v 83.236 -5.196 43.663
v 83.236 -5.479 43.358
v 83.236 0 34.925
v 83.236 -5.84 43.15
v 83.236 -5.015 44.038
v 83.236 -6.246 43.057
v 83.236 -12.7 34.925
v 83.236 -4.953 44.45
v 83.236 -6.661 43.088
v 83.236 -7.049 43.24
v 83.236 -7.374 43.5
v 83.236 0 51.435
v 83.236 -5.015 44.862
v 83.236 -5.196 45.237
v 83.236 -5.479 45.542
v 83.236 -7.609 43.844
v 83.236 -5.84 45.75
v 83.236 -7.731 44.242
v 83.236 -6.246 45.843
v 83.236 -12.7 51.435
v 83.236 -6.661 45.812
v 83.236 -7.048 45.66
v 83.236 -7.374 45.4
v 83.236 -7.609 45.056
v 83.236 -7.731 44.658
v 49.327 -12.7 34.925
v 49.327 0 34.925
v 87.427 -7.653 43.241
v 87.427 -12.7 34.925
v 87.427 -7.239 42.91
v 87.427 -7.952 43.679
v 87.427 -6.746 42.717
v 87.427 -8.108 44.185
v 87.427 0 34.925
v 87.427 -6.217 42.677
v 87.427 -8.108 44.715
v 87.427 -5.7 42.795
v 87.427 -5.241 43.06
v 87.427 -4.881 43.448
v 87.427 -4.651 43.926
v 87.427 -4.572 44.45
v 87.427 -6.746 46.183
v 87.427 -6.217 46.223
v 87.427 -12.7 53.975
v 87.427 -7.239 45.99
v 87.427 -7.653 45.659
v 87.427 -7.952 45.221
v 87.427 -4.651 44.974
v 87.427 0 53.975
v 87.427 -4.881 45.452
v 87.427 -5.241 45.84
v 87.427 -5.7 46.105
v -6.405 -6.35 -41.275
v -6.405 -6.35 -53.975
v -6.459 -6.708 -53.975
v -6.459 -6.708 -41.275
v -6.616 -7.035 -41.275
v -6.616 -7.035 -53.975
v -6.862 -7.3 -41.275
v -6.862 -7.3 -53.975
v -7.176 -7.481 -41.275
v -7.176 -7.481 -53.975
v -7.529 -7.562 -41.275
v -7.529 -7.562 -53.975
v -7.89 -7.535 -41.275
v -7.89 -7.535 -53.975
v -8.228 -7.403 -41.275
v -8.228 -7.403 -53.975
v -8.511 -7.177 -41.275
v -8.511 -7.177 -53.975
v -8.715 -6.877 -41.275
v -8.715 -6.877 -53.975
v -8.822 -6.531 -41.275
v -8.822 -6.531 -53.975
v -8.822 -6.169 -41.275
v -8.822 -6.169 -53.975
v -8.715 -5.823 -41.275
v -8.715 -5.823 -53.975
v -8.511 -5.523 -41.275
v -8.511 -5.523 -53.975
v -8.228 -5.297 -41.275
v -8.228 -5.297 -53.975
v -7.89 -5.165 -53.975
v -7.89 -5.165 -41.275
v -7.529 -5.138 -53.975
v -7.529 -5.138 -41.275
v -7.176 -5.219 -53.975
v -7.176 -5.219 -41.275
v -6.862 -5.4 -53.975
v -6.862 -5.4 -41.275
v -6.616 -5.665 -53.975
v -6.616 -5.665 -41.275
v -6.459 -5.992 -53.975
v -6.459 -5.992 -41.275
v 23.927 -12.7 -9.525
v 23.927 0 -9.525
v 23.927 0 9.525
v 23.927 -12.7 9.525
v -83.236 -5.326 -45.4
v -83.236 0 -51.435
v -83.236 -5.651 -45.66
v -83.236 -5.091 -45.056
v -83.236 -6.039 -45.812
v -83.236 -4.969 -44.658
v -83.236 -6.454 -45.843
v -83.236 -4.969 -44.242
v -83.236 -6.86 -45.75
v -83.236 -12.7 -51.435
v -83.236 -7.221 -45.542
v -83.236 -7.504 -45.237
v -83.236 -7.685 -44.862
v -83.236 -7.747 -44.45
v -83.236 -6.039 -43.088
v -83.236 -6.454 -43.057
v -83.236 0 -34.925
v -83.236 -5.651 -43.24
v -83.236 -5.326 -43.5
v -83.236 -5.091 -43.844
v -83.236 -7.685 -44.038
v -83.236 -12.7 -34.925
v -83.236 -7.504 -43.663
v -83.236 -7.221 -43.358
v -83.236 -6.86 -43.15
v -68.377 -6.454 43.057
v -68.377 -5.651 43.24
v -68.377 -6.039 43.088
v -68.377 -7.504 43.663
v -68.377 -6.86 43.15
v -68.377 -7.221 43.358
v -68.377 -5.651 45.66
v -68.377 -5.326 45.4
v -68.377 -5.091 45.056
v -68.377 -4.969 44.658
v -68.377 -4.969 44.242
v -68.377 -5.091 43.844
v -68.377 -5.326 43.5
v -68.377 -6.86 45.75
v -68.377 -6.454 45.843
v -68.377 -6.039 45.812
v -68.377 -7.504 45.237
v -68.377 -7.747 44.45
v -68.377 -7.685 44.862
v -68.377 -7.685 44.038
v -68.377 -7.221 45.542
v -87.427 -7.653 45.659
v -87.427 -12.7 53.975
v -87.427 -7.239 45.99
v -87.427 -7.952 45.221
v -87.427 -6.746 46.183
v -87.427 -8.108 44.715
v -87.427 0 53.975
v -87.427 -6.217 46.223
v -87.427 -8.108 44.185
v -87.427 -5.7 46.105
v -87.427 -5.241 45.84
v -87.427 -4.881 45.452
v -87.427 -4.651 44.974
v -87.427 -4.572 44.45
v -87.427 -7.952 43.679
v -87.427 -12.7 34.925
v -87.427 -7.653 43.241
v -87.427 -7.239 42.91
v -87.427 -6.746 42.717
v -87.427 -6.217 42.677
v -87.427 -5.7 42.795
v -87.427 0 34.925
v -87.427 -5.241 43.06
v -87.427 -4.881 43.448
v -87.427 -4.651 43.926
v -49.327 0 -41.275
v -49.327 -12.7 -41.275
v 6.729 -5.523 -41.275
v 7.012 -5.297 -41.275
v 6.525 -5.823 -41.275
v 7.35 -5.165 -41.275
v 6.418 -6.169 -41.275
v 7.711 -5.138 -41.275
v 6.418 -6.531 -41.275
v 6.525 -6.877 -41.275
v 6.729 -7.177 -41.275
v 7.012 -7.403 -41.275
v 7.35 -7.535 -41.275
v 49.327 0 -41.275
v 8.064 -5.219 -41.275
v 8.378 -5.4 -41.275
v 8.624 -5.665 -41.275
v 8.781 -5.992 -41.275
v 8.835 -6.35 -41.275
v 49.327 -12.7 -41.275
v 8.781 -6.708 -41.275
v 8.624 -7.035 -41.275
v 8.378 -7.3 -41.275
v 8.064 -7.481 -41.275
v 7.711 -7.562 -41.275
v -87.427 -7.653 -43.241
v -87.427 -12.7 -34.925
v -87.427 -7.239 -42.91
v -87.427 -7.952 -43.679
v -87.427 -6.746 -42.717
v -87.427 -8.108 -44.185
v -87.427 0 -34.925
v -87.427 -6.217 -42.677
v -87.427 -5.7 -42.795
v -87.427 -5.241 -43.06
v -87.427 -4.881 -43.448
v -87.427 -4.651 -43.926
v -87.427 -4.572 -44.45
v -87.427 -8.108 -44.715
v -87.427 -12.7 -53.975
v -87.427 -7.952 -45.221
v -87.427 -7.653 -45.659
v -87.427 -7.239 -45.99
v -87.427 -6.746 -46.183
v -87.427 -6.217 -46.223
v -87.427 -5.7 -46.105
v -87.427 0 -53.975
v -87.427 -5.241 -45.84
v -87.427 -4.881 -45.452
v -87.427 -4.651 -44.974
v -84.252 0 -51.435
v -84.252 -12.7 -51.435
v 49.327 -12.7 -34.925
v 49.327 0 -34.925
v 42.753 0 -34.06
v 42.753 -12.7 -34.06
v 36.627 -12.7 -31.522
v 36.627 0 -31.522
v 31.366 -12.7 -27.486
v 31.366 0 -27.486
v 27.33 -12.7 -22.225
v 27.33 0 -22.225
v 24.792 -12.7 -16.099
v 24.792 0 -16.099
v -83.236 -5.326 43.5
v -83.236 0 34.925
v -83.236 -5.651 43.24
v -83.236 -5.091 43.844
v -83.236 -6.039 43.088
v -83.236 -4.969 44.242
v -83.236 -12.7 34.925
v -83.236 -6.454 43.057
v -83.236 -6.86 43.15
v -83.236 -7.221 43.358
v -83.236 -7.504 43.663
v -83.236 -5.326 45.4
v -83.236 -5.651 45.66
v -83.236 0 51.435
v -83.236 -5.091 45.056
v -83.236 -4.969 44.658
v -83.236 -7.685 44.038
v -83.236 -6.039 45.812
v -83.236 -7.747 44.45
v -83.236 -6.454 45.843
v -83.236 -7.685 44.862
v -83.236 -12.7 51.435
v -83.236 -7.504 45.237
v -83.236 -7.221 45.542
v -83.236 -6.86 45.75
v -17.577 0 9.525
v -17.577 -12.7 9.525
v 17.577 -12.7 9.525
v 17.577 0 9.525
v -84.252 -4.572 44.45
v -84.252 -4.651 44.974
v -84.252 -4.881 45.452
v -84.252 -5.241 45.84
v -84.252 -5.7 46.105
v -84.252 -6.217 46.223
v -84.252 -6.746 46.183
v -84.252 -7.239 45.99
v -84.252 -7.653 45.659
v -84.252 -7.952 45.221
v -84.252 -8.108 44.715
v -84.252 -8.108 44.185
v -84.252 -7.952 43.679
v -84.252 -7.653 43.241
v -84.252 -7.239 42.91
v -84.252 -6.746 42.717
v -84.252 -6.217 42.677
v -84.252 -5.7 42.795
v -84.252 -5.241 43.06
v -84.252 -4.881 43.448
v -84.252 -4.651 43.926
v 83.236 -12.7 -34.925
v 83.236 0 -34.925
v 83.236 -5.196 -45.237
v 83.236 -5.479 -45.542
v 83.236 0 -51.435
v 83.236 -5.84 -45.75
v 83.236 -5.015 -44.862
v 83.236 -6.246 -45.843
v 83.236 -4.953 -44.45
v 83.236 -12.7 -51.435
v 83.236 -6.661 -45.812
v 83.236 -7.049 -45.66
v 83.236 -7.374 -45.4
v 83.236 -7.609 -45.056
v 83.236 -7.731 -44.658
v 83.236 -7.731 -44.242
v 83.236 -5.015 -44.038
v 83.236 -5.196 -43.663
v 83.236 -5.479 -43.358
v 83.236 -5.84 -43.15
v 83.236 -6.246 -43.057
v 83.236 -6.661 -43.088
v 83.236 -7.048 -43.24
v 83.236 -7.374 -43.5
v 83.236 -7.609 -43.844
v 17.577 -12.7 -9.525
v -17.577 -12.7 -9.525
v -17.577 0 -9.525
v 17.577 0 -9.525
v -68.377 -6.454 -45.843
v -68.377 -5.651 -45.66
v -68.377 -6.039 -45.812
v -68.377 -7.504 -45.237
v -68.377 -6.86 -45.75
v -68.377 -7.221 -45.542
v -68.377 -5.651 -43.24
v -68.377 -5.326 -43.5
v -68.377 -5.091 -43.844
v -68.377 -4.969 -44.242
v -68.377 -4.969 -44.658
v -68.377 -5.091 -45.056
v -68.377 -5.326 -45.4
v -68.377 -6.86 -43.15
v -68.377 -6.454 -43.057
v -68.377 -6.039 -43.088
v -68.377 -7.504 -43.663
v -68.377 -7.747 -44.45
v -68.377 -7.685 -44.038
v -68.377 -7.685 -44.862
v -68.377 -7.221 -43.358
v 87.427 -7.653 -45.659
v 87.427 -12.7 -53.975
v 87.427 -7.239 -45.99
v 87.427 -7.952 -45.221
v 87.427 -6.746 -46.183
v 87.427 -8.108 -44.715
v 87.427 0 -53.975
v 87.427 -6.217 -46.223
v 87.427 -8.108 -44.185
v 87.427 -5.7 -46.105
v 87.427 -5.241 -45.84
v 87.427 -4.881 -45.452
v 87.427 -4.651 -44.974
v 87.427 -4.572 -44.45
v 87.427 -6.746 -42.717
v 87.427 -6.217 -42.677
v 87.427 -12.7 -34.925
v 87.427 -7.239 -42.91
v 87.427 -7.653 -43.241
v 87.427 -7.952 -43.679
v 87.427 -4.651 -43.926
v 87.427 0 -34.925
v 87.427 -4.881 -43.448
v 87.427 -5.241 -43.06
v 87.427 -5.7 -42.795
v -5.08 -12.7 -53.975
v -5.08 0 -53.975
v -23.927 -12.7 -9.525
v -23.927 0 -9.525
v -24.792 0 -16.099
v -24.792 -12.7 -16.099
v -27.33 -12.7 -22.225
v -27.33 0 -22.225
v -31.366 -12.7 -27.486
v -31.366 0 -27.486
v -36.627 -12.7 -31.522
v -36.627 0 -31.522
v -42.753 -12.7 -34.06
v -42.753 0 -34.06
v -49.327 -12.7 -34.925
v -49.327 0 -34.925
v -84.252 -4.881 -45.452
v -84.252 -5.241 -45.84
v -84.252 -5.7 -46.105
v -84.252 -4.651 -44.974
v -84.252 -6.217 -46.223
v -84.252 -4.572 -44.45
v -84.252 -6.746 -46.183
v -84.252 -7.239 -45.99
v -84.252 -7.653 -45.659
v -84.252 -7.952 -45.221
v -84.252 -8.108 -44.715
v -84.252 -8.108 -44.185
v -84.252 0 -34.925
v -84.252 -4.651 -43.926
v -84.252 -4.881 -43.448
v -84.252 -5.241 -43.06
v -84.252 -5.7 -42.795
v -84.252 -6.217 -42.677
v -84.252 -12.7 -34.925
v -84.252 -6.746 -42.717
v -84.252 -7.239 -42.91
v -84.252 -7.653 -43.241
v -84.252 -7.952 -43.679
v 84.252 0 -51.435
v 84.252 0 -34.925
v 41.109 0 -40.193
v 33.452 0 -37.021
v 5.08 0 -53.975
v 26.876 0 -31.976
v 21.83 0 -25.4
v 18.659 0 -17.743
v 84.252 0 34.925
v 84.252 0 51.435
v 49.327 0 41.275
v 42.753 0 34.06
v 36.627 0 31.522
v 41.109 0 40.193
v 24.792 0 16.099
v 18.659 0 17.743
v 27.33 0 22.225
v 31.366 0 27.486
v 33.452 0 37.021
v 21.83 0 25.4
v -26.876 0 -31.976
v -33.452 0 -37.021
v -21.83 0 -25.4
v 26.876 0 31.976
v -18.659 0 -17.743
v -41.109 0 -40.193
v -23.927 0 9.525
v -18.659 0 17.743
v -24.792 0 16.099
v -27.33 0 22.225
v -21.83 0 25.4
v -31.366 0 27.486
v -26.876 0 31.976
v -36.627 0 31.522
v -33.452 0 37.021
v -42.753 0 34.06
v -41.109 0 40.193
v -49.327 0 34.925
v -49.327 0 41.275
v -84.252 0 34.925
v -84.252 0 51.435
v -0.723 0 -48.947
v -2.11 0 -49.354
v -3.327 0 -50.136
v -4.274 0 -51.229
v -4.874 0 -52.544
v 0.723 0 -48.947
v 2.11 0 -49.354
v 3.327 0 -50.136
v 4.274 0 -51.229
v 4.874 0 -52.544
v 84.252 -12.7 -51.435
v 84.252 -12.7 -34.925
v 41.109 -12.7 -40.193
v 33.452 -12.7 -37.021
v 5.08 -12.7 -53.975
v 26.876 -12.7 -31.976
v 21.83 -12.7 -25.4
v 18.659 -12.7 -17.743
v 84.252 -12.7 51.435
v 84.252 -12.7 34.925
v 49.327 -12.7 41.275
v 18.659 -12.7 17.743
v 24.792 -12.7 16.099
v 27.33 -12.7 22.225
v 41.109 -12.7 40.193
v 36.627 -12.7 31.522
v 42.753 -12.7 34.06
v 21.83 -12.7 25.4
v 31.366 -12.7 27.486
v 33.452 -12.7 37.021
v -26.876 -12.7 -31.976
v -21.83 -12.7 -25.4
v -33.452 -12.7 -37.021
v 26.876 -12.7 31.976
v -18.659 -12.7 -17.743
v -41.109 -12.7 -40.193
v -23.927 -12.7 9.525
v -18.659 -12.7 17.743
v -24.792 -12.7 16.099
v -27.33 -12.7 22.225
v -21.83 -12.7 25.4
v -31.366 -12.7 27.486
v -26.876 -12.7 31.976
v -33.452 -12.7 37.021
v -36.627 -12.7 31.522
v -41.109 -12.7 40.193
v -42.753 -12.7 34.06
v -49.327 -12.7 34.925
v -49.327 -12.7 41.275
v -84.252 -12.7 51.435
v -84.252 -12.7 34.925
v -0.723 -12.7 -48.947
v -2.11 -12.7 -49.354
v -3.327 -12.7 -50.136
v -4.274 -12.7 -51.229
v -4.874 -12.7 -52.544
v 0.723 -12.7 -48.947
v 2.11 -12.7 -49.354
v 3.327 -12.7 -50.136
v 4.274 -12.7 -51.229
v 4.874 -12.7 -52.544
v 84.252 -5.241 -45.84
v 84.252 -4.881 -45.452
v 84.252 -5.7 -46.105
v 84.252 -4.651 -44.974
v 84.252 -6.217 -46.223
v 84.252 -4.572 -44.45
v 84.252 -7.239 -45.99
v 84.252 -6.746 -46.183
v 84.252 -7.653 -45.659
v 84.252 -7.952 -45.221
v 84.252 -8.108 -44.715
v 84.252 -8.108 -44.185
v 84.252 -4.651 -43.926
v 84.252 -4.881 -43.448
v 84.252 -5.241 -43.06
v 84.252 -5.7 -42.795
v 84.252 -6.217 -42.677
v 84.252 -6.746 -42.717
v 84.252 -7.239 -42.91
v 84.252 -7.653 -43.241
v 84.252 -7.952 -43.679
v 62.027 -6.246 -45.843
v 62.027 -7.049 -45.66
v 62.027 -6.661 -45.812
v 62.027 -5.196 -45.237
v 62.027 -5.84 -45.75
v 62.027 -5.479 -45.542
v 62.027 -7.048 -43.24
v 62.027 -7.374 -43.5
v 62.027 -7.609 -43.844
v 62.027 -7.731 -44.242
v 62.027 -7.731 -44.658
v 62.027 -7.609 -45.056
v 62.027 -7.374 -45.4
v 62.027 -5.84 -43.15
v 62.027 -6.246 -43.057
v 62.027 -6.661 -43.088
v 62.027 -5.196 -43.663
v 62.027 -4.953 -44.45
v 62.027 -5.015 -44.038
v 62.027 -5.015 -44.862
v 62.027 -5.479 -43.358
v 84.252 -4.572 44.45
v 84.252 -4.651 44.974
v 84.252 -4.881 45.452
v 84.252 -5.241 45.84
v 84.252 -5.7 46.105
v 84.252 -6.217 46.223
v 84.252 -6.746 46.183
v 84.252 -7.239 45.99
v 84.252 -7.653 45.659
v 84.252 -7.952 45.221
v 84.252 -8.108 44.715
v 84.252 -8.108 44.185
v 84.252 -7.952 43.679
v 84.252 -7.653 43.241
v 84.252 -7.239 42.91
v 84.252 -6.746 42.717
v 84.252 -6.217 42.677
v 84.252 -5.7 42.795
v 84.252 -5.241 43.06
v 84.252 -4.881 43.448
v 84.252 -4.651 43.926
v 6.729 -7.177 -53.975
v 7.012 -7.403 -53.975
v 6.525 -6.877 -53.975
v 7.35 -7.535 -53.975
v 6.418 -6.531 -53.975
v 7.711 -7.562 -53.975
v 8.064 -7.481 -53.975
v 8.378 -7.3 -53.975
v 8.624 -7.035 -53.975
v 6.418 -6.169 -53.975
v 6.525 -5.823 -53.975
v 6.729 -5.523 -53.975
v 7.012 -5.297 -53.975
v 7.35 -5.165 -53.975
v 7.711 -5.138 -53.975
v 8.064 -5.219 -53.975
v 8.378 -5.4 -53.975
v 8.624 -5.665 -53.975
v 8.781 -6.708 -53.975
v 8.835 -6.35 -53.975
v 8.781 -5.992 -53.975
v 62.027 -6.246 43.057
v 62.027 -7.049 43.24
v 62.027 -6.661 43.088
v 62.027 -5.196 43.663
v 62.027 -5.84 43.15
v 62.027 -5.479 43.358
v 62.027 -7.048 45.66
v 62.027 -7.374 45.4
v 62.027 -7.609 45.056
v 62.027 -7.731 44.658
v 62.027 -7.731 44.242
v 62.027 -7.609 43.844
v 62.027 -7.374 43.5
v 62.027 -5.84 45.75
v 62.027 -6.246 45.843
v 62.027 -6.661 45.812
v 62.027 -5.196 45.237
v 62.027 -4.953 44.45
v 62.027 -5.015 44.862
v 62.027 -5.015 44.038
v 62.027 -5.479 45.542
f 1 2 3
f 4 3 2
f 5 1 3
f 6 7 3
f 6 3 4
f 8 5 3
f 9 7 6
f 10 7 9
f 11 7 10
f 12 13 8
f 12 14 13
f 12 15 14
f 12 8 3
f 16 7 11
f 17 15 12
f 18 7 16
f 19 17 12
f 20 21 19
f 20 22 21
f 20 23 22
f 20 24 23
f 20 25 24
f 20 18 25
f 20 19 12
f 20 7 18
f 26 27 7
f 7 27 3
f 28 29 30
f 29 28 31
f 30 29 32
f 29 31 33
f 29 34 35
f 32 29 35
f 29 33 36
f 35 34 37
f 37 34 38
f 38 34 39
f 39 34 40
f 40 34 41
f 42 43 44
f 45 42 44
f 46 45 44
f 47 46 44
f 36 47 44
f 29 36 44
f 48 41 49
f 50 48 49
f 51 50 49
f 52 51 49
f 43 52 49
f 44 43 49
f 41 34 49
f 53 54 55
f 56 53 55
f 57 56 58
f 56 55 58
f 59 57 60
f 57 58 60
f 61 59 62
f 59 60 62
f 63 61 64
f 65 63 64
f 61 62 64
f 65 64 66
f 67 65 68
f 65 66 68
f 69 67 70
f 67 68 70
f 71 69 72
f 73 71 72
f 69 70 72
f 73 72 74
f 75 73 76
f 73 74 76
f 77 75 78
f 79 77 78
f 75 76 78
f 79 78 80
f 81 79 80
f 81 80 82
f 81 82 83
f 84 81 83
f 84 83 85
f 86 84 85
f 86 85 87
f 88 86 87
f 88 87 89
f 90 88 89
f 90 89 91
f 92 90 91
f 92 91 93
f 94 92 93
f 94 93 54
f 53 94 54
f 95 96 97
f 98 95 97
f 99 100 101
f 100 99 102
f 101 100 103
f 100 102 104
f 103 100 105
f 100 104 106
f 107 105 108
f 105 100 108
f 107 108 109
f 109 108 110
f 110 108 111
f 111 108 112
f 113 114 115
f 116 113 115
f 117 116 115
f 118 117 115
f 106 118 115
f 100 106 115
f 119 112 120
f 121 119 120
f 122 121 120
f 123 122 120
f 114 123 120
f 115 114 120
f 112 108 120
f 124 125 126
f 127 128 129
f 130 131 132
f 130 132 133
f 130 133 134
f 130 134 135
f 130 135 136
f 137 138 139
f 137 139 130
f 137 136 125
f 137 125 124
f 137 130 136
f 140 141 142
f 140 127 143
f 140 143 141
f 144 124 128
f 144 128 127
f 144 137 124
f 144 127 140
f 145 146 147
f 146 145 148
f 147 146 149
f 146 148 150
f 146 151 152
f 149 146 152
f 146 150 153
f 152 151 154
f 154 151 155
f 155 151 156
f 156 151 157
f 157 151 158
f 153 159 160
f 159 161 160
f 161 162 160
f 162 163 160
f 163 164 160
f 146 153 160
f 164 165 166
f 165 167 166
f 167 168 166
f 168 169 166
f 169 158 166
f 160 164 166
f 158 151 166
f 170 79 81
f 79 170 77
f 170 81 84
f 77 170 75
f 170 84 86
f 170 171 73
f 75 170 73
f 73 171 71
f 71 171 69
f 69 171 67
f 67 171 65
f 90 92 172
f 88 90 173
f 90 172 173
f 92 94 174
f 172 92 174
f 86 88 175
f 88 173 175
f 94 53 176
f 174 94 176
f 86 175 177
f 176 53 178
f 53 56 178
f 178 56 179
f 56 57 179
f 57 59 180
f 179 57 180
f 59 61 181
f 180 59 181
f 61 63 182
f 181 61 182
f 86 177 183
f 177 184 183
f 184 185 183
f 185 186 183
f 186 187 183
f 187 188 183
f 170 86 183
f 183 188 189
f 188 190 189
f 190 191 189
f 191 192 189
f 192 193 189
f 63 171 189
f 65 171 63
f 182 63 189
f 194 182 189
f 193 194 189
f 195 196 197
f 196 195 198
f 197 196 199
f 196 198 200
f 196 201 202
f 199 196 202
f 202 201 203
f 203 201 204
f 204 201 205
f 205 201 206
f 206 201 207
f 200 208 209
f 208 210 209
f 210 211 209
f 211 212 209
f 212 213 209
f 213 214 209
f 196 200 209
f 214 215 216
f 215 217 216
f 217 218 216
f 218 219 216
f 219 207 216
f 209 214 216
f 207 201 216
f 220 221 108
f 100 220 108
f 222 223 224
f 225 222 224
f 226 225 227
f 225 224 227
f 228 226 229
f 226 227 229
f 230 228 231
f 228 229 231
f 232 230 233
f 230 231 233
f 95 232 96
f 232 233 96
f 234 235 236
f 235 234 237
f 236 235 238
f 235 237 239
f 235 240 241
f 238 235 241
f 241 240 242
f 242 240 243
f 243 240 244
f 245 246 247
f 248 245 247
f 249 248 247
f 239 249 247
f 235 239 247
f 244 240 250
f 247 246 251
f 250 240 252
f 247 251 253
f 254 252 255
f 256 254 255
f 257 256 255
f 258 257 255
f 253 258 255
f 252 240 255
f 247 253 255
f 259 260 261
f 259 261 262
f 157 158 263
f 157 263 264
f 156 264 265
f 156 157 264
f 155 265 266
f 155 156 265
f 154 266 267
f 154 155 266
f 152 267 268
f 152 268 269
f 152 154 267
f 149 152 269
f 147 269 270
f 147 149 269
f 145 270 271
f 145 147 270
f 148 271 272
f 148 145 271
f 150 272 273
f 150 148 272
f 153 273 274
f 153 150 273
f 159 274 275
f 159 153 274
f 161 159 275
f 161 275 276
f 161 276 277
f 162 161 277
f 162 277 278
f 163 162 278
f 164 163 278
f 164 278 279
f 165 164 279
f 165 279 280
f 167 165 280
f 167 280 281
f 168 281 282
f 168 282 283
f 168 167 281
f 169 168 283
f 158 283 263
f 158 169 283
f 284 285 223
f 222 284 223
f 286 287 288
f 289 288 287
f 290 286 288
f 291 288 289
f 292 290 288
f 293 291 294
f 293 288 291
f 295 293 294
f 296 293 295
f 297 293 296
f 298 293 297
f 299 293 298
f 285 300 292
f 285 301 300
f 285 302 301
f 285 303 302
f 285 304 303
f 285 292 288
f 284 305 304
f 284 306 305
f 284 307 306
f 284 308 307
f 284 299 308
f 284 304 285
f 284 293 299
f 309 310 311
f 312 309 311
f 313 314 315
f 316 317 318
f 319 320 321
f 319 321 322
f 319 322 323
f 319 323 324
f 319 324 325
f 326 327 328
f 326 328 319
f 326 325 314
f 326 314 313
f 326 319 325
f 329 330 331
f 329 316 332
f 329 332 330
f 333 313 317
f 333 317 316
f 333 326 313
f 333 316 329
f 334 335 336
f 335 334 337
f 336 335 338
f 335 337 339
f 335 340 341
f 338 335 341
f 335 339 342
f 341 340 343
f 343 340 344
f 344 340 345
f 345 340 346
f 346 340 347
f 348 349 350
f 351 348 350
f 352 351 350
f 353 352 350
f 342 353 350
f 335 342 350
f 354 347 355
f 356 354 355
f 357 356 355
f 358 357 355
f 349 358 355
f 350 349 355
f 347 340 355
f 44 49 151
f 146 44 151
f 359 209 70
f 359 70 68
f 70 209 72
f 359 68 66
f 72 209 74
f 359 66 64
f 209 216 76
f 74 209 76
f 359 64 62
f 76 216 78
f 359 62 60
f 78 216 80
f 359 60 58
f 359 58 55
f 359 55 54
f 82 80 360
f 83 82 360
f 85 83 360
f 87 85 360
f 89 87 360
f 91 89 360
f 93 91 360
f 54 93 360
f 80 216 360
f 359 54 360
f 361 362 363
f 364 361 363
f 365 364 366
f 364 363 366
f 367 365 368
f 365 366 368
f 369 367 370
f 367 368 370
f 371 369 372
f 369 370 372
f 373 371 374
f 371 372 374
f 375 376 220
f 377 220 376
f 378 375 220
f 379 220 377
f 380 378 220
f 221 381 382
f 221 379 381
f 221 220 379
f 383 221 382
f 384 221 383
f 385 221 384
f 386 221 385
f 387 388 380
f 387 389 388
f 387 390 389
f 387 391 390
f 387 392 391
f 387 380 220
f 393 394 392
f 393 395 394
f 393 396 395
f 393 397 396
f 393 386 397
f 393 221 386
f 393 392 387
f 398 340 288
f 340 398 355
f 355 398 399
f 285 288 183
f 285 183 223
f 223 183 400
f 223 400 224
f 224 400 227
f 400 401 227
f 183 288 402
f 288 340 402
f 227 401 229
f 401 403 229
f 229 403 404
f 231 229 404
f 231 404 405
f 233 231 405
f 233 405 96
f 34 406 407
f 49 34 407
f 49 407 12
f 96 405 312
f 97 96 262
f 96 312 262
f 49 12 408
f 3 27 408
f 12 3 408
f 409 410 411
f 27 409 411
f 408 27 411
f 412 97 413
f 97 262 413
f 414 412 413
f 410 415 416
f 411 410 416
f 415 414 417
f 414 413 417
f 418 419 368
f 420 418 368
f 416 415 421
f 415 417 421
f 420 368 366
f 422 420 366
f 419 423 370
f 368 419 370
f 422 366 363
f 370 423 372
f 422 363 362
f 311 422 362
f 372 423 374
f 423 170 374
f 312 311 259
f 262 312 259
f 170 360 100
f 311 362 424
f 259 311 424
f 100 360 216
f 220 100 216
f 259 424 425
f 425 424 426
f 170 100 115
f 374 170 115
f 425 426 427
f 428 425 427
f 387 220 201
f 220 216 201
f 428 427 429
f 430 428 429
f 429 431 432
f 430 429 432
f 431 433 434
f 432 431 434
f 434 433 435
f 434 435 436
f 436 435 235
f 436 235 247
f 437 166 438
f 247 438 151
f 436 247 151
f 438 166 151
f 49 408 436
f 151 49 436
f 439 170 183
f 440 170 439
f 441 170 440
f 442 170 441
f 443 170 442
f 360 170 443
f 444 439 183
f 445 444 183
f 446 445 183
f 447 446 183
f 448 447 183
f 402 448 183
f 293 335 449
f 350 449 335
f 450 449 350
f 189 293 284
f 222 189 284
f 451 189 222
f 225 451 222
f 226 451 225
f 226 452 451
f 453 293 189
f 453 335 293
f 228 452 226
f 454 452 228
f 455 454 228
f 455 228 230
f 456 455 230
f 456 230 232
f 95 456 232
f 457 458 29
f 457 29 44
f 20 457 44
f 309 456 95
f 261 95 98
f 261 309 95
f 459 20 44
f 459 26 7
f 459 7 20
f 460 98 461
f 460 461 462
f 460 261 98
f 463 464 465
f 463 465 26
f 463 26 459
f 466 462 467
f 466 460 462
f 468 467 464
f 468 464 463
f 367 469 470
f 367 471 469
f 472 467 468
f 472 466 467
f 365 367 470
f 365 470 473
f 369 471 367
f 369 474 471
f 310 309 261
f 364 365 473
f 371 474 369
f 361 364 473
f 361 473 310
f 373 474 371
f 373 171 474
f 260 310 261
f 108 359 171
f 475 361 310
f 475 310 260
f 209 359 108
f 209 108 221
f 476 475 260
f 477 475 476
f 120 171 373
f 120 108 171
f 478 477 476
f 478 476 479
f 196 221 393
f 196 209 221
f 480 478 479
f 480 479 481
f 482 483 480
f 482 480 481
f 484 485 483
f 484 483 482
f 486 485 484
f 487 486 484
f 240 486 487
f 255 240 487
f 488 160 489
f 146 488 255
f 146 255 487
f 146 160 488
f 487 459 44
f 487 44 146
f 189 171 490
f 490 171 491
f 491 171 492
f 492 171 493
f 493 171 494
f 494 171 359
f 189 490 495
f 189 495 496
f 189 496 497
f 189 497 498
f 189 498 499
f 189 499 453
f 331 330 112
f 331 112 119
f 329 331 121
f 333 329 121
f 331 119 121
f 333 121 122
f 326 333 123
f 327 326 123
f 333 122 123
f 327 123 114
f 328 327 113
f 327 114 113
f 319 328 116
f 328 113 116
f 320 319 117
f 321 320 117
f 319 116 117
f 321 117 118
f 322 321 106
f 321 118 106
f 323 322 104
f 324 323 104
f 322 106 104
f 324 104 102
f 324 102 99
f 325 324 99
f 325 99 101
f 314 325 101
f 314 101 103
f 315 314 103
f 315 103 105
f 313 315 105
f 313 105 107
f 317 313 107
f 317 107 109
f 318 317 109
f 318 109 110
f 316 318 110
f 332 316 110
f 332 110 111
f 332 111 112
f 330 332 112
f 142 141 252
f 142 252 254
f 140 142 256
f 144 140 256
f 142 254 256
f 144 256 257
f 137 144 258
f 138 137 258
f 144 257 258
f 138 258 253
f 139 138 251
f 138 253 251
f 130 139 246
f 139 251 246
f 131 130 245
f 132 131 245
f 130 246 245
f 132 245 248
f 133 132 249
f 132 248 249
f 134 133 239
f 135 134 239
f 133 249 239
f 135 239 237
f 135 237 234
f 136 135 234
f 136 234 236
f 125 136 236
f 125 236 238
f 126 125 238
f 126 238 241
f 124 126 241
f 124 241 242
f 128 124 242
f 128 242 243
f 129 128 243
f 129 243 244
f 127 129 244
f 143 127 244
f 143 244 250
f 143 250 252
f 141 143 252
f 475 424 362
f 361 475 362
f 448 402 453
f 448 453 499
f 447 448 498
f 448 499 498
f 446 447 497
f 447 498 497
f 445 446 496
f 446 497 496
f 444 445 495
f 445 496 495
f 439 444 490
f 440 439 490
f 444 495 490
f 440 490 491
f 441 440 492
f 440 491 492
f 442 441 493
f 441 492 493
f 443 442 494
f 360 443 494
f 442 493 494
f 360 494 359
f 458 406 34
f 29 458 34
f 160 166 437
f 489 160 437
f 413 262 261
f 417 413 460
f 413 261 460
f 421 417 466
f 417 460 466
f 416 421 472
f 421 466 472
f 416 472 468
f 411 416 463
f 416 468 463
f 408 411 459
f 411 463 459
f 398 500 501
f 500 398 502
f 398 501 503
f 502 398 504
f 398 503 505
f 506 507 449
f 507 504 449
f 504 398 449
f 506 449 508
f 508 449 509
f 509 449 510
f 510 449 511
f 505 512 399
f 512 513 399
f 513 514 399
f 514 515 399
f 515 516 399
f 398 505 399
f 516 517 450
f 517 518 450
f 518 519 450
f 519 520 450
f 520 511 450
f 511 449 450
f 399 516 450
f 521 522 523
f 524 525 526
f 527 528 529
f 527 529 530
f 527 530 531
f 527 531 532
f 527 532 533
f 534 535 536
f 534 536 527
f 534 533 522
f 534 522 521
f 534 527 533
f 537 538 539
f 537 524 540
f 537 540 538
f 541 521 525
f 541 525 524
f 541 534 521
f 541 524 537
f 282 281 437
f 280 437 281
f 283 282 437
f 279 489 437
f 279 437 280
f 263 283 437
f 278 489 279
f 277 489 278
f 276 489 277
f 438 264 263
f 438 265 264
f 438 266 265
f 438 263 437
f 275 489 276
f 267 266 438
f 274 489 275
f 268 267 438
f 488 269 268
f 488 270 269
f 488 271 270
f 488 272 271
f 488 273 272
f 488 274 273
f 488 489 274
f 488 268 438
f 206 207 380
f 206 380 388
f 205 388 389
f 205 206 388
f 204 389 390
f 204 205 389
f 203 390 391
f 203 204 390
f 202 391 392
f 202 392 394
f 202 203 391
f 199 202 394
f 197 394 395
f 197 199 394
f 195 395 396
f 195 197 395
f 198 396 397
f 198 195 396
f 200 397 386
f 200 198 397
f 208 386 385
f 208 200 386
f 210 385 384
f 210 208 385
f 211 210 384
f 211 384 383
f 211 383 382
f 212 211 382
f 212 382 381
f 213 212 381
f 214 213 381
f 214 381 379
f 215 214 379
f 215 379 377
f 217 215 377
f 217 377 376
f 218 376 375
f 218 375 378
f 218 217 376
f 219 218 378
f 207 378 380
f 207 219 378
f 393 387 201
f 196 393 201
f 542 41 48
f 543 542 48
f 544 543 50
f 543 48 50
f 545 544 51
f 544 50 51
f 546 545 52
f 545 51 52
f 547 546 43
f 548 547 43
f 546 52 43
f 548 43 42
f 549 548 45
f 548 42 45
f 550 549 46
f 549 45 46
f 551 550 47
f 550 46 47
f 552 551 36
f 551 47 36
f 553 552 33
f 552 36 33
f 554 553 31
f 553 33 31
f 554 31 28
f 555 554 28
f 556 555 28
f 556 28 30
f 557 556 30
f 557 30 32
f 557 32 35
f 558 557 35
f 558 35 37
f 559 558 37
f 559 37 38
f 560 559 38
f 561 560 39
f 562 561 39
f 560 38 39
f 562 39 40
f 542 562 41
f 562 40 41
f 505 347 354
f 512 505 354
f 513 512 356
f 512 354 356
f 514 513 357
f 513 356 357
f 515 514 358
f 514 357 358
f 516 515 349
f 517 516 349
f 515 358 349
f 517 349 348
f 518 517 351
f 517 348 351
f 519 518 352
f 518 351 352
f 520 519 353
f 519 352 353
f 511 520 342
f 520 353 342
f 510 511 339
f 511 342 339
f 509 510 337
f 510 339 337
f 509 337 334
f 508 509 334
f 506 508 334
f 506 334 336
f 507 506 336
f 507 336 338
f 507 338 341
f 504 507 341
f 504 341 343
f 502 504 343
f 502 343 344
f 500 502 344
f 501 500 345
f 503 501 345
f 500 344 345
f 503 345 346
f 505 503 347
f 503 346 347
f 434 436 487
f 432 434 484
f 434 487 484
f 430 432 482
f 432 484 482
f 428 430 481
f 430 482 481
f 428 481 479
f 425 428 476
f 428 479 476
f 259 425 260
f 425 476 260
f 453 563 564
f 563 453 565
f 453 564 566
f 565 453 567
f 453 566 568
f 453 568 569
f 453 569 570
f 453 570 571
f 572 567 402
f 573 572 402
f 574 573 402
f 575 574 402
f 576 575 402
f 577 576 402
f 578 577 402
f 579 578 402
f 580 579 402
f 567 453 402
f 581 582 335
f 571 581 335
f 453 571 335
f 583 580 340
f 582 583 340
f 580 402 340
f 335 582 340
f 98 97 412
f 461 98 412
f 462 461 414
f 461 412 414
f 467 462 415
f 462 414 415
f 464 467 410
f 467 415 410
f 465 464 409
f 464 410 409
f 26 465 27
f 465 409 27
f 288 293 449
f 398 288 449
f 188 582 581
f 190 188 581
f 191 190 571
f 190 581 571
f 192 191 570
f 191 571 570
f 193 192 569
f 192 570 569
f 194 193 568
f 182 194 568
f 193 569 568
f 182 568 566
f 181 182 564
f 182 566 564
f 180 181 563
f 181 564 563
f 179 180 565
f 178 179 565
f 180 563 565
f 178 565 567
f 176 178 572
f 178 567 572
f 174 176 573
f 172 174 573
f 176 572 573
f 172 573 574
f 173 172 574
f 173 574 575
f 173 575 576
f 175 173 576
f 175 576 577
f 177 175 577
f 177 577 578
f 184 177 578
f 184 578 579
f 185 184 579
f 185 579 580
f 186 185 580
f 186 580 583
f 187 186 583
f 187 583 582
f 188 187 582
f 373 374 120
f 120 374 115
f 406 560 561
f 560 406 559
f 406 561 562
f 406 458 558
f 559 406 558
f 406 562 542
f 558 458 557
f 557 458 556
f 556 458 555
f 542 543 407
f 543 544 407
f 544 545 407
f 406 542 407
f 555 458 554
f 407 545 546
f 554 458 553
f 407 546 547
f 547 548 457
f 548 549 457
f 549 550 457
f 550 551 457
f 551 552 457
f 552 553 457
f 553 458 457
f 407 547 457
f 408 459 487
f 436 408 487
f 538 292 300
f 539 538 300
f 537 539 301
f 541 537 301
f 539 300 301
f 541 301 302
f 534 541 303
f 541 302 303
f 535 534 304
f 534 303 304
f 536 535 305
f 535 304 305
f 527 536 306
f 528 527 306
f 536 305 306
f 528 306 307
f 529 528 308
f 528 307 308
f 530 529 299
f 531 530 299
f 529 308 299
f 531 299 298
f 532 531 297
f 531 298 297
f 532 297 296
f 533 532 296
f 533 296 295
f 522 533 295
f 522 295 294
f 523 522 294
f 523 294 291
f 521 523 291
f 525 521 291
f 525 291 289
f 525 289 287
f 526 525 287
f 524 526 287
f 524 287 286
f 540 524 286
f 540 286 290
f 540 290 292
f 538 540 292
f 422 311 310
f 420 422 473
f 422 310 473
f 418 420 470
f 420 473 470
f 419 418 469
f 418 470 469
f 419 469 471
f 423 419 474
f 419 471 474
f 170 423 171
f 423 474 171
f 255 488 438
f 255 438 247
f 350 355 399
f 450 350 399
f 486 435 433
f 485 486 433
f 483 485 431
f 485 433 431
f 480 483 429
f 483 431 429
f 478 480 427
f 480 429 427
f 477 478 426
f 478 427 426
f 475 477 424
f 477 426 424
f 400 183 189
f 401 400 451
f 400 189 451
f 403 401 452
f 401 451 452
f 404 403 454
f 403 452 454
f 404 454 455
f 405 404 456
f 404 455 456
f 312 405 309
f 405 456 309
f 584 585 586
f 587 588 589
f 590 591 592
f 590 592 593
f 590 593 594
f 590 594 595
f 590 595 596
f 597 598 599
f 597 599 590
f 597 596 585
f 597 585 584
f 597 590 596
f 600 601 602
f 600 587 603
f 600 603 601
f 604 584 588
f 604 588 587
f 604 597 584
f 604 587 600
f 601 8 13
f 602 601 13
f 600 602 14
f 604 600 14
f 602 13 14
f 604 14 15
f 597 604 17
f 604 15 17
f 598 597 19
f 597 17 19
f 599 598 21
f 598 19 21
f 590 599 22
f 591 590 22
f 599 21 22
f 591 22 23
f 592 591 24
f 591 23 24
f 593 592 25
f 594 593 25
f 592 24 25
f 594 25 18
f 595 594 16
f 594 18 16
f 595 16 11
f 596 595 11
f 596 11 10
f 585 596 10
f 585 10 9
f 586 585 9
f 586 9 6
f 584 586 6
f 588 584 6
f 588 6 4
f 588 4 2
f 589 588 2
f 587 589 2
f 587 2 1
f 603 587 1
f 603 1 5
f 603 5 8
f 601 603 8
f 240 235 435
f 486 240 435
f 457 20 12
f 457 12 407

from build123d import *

# Parameters (mm, degrees)
F1_DEPTH  = 12.7
F2_W      = 1.016
F2_H      = 102.87
F3_DEPTH  = 25.4
F4_R      = 5.08
F5_DEPTH  = 25.4
F6_R      = 1.21539
F7_DEPTH  = 25.4
F8_R      = 1.397
F9_DEPTH  = 25.4
F10_R     = 1.397
F11_DEPTH = 19.05
F12_R     = 1.778
F13_DEPTH = 3.175
F15_DEPTH = 25.4
F16_W     = 12.7
F16_H     = 19.05
F17_DEPTH = 38.1


# Not quite as in the source:
# - a pattern or mirror of a feature is missing from the dataset's text; its kind, count and spacing are read off the source's solid


with BuildPart() as f1:
    # F0 (on Front) → F1 (new body)
    with BuildSketch(Plane.XZ):
        with BuildLine():
            Line((87.4268, 34.925), (87.4268, 53.975))
            Line((87.4268, 53.975), (0, 53.975))
            Line((0, 53.975), (-87.4268, 53.975))
            Line((-87.4268, 53.975), (-87.4268, 34.925))
            Line((-87.4268, 34.925), (-49.3268, 34.925))
            ThreePointArc((-49.3268, 34.925), (-31.3662877579, 27.4855122421), (-23.9268, 9.525))
            Line((-23.9268, 9.525), (-23.9268, -9.525))
            ThreePointArc((-23.9268, -9.525), (-31.3662877579, -27.4855122421), (-49.3268, -34.925))
            Line((-49.3268, -34.925), (-87.4268, -34.925))
            Line((-87.4268, -34.925), (-87.4268, -53.975))
            Line((-87.4268, -53.975), (87.4268, -53.975))
            Line((87.4268, -53.975), (87.4268, -34.925))
            Line((87.4268, -34.925), (49.3268, -34.925))
            ThreePointArc((49.3268, -34.925), (31.3662877579, -27.4855122421), (23.9268, -9.525))
            Line((23.9268, -9.525), (23.9268, 9.525))
            ThreePointArc((23.9268, 9.525), (31.3662877579, 27.4855122421), (49.3268, 34.925))
            Line((49.3268, 34.925), (87.4268, 34.925))
        make_face()
    extrude(amount=F1_DEPTH)

    # F2 (on face) → F3 (cut)
    with BuildSketch(Plane.XZ.offset(12.7)):
        with Locations((-83.7438, 0)):
            Rectangle(F2_W, F2_H)
        with Locations((83.7438, 0)):
            Rectangle(F2_W, F2_H)
    extrude(amount=-F3_DEPTH, mode=Mode.SUBTRACT)

    # F4 (on face) → F5 (cut)
    with BuildSketch(Plane.XZ.offset(12.7)):
        with Locations((0, -53.975)):
            Circle(F4_R)
    extrude(amount=-F5_DEPTH, mode=Mode.SUBTRACT)

    # F6 (on face) → F7 (cut)
    with BuildSketch(Plane(origin=(0, 0, -53.975), x_dir=(1, 0, 0), z_dir=(0, 0, -1))):
        with Locations((-7.62, 6.35)):
            Circle(F6_R)
        with Locations((7.62, 6.35)):
            Circle(F6_R)
    extrude(amount=-F7_DEPTH, mode=Mode.SUBTRACT)

    # F8 (on face) → F9 (cut)
    with BuildSketch(Plane.YZ.offset(87.4268)):
        with Locations((-6.35, 44.45)):
            Circle(F8_R)
        with Locations((-6.35, -44.45)):
            Circle(F8_R)
    extrude(amount=-F9_DEPTH, mode=Mode.SUBTRACT)

    # F10 (on face) → F11 (cut)
    with BuildSketch(Plane(origin=(-87.4268, 0, 0), x_dir=(0, -1, 0), z_dir=(-1, 0, 0))):
        with Locations((6.35, 44.45)):
            Circle(F10_R)
        with Locations((6.35, -44.45)):
            Circle(F10_R)
    extrude(amount=-F11_DEPTH, mode=Mode.SUBTRACT)

    # F12 (on face) → F13 (cut)
    with BuildSketch(Plane.YZ.offset(87.4268)):
        with Locations((-6.35, 44.45)):
            Circle(F12_R)
        with Locations((-6.35, -44.45)):
            Circle(F12_R)
    f13 = extrude(amount=-F13_DEPTH, mode=Mode.SUBTRACT)

    # F13_copies: F13 across plane
    add(f13.mirror(Plane(origin=(0, 0, 0), x_dir=(0, 0, -1), z_dir=(-1, 0, 0))), mode=Mode.SUBTRACT)

    # F14 (on face) → F15 (cut)
    with BuildSketch(Plane.XZ.offset(12.7)):
        with BuildLine():
            ThreePointArc((-17.5768, -9.525), (-26.8761596973, -31.9756403027), (-49.3268, -41.275))
            Line((-49.3268, -41.275), (49.3268, -41.275))
            ThreePointArc((49.3268, -41.275), (26.8761596973, -31.9756403027), (17.5768, -9.525))
            Line((17.5768, -9.525), (17.5768, 9.525))
            ThreePointArc((17.5768, 9.525), (26.8761596973, 31.9756403027), (49.3268, 41.275))
            Line((49.3268, 41.275), (-49.3268, 41.275))
            ThreePointArc((-49.3268, 41.275), (-26.8761596973, 31.9756403027), (-17.5768, 9.525))
            Line((-17.5768, 9.525), (-17.5768, -9.525))
        make_face()
    extrude(amount=-F15_DEPTH, mode=Mode.SUBTRACT)

    # F16 (on face) → F17 (join)
    with BuildSketch(Plane.YZ.offset(-17.5768)):
        with Locations((-6.35, 0)):
            Rectangle(F16_W, F16_H)
    extrude(amount=F17_DEPTH)


solid = f1.part
